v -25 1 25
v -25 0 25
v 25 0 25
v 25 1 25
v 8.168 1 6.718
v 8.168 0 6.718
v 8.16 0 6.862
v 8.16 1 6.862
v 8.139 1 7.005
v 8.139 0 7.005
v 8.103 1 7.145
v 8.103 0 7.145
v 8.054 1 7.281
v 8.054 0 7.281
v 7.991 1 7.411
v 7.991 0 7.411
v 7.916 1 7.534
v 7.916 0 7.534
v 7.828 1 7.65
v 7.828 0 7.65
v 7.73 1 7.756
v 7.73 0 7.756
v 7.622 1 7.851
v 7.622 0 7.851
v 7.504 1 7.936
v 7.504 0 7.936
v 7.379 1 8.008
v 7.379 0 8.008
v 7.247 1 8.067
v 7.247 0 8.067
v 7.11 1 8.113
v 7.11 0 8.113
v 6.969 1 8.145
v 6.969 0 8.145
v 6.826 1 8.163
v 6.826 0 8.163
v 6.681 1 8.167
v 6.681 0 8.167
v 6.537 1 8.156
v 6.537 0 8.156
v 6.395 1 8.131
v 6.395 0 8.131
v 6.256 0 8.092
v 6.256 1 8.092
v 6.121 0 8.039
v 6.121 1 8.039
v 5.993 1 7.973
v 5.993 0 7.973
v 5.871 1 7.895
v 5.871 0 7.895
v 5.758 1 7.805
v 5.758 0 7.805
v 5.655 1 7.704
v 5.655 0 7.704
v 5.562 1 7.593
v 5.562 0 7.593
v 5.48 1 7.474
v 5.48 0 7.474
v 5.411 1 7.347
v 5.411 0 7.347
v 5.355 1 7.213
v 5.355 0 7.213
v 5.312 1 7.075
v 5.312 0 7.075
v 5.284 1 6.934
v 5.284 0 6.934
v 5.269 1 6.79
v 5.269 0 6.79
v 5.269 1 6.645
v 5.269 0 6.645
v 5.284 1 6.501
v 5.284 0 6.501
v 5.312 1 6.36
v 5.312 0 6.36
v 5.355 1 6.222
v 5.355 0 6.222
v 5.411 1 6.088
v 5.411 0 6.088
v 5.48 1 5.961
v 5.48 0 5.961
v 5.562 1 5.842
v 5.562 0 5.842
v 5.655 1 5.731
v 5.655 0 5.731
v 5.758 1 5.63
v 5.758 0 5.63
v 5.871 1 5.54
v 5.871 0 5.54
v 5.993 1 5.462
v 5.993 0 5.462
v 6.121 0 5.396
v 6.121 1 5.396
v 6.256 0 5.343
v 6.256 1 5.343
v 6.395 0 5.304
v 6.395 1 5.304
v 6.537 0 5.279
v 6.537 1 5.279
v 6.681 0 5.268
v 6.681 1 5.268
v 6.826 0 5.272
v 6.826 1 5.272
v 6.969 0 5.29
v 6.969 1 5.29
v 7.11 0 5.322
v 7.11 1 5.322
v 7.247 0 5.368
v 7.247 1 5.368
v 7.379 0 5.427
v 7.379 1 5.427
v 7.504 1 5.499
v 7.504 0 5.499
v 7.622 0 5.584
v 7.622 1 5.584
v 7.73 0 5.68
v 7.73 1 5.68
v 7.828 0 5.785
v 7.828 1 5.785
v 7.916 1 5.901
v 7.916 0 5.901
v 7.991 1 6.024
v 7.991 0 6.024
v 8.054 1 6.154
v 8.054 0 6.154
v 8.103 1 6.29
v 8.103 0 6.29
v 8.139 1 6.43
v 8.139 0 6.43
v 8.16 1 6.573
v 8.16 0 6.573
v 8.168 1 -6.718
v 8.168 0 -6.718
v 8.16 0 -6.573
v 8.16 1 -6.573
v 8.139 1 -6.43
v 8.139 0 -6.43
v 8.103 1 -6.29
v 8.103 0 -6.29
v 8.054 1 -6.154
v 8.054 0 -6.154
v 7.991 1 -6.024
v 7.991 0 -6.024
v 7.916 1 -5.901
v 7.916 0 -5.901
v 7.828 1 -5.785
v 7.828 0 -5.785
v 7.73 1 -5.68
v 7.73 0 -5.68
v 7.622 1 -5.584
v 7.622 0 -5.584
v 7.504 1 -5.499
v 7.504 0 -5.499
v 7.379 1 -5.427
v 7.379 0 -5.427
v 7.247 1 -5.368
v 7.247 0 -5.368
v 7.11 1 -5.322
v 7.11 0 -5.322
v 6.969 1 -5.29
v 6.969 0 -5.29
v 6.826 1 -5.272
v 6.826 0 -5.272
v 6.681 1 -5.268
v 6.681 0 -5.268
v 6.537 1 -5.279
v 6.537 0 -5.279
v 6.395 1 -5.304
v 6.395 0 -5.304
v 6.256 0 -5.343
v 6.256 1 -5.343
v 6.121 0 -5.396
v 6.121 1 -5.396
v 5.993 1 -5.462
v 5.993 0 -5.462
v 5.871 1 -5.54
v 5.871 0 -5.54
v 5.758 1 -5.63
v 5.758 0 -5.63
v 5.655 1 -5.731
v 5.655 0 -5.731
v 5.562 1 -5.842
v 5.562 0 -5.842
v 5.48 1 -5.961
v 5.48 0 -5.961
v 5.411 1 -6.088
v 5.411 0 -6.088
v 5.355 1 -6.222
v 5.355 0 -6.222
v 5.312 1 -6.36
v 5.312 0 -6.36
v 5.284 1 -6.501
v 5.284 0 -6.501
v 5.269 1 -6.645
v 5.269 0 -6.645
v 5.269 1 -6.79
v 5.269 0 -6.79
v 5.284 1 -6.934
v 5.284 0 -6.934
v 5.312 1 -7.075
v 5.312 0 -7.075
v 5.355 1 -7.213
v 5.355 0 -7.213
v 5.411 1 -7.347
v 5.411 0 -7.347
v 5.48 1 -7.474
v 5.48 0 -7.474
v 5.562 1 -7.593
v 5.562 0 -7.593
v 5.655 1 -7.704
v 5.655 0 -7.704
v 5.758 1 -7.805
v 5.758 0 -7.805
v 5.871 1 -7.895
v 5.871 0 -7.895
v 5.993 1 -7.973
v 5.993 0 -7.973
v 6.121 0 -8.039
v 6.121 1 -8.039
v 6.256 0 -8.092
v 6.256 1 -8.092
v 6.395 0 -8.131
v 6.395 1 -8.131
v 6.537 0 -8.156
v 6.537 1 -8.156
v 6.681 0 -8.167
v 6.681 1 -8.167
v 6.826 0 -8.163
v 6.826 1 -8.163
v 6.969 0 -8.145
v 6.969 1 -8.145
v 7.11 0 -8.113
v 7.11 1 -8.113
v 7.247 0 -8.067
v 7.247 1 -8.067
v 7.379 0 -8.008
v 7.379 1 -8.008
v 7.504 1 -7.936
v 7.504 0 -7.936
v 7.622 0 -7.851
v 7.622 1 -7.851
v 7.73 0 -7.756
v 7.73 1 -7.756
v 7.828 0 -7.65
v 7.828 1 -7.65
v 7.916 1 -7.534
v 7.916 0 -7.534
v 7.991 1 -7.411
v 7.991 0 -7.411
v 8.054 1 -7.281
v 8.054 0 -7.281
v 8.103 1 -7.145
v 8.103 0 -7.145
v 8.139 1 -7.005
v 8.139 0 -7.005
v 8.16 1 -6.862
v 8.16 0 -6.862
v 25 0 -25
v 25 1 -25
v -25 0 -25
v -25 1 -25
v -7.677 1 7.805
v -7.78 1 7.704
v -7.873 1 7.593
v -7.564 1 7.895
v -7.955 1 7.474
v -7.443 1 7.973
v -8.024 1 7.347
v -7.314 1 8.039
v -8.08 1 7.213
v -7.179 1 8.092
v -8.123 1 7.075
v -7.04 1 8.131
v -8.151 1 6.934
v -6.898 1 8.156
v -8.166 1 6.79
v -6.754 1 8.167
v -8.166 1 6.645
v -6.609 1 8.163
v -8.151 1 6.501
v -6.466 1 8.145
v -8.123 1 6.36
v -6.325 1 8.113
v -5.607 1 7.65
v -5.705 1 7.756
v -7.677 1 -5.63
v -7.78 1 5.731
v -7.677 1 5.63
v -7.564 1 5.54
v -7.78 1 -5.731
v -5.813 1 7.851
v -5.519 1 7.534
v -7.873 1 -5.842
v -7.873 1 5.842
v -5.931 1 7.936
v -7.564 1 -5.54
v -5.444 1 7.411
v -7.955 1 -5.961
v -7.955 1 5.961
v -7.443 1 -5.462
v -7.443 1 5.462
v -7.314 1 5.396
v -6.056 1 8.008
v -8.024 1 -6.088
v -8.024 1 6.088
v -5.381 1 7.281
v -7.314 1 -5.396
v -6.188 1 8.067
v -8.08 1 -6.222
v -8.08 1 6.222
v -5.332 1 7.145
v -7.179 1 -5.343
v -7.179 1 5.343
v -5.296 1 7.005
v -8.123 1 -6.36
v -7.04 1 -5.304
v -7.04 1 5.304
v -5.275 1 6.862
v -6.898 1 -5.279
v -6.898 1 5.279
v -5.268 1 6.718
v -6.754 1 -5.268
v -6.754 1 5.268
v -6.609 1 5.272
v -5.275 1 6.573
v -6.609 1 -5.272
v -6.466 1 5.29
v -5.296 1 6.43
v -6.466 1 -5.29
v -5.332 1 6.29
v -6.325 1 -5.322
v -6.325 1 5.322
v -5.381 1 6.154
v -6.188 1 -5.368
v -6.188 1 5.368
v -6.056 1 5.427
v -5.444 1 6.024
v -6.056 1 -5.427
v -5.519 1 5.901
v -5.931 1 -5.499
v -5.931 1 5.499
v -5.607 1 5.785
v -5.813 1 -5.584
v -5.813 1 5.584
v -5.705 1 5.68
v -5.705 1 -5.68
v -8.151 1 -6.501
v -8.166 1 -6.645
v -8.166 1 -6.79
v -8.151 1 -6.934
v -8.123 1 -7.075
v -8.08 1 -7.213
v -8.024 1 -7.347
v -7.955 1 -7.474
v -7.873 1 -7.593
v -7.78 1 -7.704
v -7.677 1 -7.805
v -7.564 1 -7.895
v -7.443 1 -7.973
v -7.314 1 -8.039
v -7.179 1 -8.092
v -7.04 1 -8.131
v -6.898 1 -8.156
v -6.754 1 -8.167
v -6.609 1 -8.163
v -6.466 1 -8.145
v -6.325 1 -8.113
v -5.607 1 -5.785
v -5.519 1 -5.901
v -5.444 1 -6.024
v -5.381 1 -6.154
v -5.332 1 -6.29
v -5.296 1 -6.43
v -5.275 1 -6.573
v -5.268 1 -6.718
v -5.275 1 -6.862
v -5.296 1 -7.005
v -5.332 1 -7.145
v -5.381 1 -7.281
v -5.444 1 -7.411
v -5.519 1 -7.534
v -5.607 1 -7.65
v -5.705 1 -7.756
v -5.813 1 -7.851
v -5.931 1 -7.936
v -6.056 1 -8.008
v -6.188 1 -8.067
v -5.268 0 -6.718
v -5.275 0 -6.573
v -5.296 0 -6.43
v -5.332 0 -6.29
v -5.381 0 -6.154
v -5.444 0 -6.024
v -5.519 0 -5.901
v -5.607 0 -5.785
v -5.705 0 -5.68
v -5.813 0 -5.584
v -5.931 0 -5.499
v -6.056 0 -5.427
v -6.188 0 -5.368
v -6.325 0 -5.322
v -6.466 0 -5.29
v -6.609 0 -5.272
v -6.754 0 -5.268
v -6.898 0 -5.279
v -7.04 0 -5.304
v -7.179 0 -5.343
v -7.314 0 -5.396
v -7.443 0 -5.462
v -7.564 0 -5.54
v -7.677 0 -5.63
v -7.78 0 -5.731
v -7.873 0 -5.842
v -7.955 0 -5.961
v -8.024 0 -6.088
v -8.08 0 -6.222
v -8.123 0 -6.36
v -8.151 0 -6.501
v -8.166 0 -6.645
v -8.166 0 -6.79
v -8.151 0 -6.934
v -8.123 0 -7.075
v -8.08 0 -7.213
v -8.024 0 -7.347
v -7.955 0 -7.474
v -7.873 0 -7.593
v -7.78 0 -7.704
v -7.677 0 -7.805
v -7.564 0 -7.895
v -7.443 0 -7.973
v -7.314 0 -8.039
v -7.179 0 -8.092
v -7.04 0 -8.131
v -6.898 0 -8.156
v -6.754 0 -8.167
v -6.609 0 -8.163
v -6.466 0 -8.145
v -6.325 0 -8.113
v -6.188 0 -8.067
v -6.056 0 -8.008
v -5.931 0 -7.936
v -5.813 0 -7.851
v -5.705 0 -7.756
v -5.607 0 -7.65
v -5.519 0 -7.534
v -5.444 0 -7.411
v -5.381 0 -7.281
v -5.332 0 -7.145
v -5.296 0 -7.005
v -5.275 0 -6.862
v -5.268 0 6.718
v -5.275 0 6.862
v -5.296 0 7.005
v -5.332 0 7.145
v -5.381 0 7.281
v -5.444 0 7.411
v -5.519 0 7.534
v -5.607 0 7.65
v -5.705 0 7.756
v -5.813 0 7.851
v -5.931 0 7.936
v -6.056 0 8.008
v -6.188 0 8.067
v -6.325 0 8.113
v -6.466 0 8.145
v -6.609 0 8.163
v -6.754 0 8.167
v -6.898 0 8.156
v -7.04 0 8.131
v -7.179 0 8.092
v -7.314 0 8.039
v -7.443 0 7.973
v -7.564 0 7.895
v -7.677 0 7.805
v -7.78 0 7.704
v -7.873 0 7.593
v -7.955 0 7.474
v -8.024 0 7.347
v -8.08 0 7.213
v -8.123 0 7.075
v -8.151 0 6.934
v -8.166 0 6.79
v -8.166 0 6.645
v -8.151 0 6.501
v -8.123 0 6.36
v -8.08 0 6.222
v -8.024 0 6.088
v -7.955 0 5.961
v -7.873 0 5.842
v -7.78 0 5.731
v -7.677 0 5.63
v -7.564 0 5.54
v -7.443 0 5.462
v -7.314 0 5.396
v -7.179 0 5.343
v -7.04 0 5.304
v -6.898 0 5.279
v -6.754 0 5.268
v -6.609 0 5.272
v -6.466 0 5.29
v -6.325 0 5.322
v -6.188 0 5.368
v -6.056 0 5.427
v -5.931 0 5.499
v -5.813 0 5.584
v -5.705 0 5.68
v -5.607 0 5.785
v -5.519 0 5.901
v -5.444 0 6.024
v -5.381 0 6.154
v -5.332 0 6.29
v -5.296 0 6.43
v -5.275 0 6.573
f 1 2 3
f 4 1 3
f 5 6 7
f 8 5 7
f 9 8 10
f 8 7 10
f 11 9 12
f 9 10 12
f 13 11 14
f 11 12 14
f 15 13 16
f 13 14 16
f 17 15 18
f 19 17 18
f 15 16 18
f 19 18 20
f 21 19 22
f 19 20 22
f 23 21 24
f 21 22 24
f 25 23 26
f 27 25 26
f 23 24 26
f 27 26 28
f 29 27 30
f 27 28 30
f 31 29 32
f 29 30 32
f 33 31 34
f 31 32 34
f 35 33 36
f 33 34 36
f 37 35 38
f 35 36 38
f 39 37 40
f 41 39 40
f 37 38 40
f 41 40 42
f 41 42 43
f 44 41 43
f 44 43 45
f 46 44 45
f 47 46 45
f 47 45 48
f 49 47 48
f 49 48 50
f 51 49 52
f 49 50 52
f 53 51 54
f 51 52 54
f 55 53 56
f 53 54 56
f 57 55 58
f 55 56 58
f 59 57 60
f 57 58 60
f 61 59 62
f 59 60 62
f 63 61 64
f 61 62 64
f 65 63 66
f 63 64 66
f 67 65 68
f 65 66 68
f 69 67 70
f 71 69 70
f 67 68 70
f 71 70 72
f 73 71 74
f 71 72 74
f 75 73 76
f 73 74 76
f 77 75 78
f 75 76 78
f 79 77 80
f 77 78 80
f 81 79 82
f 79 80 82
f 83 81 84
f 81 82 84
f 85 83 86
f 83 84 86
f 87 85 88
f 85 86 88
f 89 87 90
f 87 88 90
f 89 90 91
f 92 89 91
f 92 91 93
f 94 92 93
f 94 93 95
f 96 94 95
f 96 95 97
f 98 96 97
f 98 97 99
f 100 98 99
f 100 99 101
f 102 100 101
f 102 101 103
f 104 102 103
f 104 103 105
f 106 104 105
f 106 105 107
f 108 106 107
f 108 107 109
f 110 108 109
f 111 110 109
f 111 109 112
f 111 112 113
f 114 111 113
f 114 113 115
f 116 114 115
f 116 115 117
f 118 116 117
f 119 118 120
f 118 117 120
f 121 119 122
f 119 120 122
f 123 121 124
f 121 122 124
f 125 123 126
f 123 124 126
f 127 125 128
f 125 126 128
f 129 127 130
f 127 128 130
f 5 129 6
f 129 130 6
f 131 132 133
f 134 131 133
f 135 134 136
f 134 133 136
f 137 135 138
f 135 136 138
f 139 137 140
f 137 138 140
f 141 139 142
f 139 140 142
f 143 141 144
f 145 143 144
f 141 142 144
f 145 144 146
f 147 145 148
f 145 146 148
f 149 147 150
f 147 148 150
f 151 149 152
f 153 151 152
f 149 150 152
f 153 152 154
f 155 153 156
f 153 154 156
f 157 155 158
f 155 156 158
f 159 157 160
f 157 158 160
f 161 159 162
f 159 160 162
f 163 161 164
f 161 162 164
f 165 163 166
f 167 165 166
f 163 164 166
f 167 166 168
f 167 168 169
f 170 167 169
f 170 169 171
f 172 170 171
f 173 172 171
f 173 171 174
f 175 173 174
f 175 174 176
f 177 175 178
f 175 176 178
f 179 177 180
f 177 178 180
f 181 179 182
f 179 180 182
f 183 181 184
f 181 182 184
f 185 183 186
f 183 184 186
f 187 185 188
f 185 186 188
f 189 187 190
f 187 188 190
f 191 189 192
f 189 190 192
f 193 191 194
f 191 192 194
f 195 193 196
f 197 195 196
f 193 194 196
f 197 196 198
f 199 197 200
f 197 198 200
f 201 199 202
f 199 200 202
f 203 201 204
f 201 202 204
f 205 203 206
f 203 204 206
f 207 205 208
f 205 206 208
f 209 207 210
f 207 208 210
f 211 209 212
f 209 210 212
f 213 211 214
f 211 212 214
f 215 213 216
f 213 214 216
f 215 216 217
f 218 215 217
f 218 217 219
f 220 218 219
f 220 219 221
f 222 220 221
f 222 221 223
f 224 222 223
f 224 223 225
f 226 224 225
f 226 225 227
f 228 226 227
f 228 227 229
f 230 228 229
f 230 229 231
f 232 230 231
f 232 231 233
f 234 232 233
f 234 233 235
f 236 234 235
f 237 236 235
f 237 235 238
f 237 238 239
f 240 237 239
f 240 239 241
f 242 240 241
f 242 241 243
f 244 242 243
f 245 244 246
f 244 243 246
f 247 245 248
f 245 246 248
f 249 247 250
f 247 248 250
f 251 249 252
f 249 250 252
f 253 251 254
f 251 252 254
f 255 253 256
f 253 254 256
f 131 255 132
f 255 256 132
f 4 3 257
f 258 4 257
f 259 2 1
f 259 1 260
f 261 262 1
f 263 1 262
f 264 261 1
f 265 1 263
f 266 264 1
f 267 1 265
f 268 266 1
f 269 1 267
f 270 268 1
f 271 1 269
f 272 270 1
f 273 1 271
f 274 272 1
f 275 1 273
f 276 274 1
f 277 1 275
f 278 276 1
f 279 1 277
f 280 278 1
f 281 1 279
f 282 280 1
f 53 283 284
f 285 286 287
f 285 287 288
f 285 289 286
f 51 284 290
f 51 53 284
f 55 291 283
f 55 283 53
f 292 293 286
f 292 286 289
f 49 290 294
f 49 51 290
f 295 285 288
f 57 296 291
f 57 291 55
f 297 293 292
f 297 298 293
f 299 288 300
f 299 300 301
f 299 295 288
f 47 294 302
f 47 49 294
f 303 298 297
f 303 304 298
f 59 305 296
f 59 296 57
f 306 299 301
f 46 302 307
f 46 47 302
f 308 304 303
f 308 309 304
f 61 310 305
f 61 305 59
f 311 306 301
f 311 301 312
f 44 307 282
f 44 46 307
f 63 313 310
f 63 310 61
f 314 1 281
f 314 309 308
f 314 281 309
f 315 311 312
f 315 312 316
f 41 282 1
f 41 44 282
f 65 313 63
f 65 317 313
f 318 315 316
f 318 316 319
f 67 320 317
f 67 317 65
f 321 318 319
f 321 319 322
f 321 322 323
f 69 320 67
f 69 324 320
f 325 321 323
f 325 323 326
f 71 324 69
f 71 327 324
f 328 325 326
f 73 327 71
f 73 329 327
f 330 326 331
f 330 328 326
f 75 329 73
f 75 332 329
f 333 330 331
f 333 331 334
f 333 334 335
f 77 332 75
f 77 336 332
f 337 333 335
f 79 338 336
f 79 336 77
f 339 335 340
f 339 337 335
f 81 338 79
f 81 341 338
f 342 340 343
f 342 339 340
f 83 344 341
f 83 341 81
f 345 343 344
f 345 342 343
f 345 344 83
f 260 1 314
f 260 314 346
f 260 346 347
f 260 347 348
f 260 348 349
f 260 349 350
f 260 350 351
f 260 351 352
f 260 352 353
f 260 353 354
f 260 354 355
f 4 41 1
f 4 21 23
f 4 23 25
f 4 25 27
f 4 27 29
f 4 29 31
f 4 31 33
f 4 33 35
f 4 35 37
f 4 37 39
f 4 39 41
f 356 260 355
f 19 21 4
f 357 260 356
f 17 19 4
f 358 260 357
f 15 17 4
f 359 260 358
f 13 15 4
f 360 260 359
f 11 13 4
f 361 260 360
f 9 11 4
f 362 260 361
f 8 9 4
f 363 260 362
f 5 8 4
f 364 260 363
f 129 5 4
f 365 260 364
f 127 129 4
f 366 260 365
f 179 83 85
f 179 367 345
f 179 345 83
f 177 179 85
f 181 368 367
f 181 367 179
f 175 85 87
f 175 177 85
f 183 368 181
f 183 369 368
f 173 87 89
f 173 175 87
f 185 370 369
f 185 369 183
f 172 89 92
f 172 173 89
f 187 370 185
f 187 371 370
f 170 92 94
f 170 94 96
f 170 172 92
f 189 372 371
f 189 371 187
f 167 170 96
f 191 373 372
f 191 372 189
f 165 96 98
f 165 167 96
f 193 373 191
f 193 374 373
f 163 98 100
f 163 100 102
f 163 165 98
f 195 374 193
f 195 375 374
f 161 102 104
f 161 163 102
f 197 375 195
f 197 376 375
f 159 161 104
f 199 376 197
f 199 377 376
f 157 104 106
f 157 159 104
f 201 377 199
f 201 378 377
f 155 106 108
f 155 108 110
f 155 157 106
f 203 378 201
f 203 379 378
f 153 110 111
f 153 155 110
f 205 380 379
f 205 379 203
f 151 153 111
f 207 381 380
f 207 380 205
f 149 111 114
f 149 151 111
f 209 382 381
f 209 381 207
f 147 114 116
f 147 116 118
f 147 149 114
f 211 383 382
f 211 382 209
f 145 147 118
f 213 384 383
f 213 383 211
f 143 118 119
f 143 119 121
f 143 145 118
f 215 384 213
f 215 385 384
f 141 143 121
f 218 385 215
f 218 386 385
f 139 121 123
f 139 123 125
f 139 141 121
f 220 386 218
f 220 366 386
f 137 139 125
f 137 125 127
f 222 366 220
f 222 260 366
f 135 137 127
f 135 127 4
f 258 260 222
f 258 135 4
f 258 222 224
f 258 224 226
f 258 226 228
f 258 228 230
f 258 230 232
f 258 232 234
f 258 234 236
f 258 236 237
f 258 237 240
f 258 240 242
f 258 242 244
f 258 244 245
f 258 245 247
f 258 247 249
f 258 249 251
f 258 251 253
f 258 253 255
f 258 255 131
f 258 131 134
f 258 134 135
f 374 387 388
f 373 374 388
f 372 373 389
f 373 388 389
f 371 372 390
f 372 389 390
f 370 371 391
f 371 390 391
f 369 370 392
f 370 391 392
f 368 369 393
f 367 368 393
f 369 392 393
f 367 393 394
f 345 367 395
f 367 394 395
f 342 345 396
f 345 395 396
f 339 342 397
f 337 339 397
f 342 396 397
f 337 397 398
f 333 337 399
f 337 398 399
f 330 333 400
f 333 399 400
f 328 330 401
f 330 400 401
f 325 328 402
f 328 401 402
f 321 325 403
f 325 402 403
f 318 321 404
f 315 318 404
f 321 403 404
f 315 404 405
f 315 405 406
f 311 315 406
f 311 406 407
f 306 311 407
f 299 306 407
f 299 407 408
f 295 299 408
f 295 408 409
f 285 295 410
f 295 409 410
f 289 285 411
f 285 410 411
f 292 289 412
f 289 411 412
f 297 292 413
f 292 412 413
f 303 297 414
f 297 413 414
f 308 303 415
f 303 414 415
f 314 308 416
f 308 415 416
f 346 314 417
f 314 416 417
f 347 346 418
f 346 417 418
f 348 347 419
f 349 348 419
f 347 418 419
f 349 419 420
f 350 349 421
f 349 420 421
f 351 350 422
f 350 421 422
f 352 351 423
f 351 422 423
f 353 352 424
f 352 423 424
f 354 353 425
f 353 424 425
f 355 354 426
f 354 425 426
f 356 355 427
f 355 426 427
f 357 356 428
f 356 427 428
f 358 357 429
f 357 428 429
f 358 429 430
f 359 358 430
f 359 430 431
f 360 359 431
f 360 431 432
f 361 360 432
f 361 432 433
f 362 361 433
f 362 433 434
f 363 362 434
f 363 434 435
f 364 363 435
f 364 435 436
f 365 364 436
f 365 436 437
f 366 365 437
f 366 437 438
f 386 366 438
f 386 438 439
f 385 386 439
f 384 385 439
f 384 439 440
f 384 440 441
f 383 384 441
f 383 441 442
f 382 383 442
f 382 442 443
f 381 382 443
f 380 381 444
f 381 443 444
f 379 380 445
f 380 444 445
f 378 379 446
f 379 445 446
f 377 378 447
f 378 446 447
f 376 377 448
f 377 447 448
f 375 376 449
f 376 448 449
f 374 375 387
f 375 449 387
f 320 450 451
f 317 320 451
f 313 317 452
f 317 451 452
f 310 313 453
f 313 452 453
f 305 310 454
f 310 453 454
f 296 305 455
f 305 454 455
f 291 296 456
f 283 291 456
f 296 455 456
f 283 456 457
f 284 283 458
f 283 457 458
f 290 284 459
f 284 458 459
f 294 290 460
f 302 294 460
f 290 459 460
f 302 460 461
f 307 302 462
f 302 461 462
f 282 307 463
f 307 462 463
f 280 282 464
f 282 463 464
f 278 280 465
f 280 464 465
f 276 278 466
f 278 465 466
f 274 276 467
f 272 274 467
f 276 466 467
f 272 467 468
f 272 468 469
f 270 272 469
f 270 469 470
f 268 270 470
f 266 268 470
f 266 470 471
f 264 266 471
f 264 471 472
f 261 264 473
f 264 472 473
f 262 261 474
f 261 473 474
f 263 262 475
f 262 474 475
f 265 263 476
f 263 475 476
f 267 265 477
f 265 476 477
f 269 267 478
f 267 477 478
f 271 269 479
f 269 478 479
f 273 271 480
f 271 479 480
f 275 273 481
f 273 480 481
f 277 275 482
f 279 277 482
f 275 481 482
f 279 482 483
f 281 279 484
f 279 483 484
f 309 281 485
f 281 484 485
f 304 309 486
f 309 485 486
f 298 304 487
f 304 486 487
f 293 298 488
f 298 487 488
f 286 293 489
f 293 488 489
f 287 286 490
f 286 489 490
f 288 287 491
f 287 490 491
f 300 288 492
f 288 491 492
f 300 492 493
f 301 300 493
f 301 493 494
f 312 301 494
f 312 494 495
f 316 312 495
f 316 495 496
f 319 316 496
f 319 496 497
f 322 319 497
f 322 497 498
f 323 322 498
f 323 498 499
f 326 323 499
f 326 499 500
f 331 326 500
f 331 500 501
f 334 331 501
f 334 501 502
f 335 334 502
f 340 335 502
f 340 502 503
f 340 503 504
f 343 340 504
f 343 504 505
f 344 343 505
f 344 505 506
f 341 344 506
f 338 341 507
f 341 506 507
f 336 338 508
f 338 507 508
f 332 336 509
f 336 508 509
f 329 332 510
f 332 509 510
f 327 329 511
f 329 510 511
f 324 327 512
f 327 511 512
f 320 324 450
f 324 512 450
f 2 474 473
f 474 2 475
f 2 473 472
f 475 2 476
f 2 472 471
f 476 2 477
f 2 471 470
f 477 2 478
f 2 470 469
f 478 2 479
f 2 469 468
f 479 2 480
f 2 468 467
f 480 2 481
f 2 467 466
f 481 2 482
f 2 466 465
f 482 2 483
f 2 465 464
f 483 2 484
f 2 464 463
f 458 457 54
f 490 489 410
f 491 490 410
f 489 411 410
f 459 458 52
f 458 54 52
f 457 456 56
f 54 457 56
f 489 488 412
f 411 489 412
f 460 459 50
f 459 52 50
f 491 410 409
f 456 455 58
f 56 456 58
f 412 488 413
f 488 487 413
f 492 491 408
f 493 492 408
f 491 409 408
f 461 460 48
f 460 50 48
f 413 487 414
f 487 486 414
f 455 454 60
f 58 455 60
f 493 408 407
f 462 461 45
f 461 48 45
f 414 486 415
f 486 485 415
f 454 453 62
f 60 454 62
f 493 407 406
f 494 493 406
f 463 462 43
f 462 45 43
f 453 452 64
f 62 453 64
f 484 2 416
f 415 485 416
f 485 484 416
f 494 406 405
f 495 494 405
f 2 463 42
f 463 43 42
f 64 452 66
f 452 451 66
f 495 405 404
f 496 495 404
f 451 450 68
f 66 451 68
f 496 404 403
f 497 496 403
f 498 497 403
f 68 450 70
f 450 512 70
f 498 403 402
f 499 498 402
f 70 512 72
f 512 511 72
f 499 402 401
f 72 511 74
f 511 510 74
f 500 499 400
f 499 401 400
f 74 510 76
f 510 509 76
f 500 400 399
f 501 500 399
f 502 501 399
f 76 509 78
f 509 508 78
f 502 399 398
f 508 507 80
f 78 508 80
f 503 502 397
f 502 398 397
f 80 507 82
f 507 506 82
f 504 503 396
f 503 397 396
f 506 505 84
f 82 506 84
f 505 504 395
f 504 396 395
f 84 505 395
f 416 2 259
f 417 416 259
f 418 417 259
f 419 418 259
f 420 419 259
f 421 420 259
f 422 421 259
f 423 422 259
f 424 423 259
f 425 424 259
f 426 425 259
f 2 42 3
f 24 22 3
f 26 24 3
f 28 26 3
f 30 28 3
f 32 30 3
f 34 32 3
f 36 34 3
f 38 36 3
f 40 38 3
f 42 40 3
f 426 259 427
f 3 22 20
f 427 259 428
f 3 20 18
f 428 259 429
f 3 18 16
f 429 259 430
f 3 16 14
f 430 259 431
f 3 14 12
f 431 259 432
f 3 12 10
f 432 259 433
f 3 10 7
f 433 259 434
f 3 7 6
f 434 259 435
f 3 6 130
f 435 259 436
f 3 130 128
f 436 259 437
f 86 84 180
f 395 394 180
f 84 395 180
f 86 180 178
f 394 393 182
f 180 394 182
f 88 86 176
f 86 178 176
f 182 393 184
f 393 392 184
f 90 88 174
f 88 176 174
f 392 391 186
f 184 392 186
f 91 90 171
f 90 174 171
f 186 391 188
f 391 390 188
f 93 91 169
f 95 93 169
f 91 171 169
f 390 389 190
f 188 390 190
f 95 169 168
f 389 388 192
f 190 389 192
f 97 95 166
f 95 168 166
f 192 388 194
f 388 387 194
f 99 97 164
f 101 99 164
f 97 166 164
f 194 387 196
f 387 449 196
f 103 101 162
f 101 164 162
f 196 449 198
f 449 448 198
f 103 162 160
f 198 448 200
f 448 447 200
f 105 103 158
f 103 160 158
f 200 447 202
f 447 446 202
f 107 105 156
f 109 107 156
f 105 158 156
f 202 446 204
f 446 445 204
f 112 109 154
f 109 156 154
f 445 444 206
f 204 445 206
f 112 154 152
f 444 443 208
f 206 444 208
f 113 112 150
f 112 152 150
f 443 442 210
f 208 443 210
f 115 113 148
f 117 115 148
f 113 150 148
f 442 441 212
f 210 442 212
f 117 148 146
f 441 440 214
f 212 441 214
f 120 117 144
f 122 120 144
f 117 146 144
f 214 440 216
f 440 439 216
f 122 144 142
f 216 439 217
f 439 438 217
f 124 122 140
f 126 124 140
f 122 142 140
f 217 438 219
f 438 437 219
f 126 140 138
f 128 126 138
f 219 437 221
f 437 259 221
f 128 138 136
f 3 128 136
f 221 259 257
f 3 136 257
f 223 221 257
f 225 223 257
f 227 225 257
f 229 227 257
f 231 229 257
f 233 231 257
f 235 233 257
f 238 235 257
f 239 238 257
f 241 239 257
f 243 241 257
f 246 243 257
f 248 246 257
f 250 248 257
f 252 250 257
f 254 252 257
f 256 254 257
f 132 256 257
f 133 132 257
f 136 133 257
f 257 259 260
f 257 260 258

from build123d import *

# Parameters (mm, degrees)
SKETCH_1_W          = 50
SKETCH_1_H          = 50
EXTRUDE_1_DEPTH     = 1
SKETCH_3_R          = 1.45
CUT_EXTRUDE_1_DEPTH = 1


with BuildPart() as part:
    # 草图1 → 凸台-拉伸1 (new body)
    with BuildSketch(Plane(origin=(0, 0, 0), x_dir=(1, 0, 0), z_dir=(0, 1, 0))):
        Rectangle(SKETCH_1_W, SKETCH_1_H)
    extrude(amount=EXTRUDE_1_DEPTH)

    # 草图3 → 切除-拉伸1 (cut)
    with BuildSketch(Plane.XZ):
        with Locations((-6.717514421, -6.717514421)):
            Circle(SKETCH_3_R)
        with Locations((-6.717514421, 6.717514421)):
            Circle(SKETCH_3_R)
        with Locations((6.717514421, 6.717514421)):
            Circle(SKETCH_3_R)
        with Locations((6.717514421, -6.717514421)):
            Circle(SKETCH_3_R)
    extrude(amount=-CUT_EXTRUDE_1_DEPTH, mode=Mode.SUBTRACT)


solid = part.part
